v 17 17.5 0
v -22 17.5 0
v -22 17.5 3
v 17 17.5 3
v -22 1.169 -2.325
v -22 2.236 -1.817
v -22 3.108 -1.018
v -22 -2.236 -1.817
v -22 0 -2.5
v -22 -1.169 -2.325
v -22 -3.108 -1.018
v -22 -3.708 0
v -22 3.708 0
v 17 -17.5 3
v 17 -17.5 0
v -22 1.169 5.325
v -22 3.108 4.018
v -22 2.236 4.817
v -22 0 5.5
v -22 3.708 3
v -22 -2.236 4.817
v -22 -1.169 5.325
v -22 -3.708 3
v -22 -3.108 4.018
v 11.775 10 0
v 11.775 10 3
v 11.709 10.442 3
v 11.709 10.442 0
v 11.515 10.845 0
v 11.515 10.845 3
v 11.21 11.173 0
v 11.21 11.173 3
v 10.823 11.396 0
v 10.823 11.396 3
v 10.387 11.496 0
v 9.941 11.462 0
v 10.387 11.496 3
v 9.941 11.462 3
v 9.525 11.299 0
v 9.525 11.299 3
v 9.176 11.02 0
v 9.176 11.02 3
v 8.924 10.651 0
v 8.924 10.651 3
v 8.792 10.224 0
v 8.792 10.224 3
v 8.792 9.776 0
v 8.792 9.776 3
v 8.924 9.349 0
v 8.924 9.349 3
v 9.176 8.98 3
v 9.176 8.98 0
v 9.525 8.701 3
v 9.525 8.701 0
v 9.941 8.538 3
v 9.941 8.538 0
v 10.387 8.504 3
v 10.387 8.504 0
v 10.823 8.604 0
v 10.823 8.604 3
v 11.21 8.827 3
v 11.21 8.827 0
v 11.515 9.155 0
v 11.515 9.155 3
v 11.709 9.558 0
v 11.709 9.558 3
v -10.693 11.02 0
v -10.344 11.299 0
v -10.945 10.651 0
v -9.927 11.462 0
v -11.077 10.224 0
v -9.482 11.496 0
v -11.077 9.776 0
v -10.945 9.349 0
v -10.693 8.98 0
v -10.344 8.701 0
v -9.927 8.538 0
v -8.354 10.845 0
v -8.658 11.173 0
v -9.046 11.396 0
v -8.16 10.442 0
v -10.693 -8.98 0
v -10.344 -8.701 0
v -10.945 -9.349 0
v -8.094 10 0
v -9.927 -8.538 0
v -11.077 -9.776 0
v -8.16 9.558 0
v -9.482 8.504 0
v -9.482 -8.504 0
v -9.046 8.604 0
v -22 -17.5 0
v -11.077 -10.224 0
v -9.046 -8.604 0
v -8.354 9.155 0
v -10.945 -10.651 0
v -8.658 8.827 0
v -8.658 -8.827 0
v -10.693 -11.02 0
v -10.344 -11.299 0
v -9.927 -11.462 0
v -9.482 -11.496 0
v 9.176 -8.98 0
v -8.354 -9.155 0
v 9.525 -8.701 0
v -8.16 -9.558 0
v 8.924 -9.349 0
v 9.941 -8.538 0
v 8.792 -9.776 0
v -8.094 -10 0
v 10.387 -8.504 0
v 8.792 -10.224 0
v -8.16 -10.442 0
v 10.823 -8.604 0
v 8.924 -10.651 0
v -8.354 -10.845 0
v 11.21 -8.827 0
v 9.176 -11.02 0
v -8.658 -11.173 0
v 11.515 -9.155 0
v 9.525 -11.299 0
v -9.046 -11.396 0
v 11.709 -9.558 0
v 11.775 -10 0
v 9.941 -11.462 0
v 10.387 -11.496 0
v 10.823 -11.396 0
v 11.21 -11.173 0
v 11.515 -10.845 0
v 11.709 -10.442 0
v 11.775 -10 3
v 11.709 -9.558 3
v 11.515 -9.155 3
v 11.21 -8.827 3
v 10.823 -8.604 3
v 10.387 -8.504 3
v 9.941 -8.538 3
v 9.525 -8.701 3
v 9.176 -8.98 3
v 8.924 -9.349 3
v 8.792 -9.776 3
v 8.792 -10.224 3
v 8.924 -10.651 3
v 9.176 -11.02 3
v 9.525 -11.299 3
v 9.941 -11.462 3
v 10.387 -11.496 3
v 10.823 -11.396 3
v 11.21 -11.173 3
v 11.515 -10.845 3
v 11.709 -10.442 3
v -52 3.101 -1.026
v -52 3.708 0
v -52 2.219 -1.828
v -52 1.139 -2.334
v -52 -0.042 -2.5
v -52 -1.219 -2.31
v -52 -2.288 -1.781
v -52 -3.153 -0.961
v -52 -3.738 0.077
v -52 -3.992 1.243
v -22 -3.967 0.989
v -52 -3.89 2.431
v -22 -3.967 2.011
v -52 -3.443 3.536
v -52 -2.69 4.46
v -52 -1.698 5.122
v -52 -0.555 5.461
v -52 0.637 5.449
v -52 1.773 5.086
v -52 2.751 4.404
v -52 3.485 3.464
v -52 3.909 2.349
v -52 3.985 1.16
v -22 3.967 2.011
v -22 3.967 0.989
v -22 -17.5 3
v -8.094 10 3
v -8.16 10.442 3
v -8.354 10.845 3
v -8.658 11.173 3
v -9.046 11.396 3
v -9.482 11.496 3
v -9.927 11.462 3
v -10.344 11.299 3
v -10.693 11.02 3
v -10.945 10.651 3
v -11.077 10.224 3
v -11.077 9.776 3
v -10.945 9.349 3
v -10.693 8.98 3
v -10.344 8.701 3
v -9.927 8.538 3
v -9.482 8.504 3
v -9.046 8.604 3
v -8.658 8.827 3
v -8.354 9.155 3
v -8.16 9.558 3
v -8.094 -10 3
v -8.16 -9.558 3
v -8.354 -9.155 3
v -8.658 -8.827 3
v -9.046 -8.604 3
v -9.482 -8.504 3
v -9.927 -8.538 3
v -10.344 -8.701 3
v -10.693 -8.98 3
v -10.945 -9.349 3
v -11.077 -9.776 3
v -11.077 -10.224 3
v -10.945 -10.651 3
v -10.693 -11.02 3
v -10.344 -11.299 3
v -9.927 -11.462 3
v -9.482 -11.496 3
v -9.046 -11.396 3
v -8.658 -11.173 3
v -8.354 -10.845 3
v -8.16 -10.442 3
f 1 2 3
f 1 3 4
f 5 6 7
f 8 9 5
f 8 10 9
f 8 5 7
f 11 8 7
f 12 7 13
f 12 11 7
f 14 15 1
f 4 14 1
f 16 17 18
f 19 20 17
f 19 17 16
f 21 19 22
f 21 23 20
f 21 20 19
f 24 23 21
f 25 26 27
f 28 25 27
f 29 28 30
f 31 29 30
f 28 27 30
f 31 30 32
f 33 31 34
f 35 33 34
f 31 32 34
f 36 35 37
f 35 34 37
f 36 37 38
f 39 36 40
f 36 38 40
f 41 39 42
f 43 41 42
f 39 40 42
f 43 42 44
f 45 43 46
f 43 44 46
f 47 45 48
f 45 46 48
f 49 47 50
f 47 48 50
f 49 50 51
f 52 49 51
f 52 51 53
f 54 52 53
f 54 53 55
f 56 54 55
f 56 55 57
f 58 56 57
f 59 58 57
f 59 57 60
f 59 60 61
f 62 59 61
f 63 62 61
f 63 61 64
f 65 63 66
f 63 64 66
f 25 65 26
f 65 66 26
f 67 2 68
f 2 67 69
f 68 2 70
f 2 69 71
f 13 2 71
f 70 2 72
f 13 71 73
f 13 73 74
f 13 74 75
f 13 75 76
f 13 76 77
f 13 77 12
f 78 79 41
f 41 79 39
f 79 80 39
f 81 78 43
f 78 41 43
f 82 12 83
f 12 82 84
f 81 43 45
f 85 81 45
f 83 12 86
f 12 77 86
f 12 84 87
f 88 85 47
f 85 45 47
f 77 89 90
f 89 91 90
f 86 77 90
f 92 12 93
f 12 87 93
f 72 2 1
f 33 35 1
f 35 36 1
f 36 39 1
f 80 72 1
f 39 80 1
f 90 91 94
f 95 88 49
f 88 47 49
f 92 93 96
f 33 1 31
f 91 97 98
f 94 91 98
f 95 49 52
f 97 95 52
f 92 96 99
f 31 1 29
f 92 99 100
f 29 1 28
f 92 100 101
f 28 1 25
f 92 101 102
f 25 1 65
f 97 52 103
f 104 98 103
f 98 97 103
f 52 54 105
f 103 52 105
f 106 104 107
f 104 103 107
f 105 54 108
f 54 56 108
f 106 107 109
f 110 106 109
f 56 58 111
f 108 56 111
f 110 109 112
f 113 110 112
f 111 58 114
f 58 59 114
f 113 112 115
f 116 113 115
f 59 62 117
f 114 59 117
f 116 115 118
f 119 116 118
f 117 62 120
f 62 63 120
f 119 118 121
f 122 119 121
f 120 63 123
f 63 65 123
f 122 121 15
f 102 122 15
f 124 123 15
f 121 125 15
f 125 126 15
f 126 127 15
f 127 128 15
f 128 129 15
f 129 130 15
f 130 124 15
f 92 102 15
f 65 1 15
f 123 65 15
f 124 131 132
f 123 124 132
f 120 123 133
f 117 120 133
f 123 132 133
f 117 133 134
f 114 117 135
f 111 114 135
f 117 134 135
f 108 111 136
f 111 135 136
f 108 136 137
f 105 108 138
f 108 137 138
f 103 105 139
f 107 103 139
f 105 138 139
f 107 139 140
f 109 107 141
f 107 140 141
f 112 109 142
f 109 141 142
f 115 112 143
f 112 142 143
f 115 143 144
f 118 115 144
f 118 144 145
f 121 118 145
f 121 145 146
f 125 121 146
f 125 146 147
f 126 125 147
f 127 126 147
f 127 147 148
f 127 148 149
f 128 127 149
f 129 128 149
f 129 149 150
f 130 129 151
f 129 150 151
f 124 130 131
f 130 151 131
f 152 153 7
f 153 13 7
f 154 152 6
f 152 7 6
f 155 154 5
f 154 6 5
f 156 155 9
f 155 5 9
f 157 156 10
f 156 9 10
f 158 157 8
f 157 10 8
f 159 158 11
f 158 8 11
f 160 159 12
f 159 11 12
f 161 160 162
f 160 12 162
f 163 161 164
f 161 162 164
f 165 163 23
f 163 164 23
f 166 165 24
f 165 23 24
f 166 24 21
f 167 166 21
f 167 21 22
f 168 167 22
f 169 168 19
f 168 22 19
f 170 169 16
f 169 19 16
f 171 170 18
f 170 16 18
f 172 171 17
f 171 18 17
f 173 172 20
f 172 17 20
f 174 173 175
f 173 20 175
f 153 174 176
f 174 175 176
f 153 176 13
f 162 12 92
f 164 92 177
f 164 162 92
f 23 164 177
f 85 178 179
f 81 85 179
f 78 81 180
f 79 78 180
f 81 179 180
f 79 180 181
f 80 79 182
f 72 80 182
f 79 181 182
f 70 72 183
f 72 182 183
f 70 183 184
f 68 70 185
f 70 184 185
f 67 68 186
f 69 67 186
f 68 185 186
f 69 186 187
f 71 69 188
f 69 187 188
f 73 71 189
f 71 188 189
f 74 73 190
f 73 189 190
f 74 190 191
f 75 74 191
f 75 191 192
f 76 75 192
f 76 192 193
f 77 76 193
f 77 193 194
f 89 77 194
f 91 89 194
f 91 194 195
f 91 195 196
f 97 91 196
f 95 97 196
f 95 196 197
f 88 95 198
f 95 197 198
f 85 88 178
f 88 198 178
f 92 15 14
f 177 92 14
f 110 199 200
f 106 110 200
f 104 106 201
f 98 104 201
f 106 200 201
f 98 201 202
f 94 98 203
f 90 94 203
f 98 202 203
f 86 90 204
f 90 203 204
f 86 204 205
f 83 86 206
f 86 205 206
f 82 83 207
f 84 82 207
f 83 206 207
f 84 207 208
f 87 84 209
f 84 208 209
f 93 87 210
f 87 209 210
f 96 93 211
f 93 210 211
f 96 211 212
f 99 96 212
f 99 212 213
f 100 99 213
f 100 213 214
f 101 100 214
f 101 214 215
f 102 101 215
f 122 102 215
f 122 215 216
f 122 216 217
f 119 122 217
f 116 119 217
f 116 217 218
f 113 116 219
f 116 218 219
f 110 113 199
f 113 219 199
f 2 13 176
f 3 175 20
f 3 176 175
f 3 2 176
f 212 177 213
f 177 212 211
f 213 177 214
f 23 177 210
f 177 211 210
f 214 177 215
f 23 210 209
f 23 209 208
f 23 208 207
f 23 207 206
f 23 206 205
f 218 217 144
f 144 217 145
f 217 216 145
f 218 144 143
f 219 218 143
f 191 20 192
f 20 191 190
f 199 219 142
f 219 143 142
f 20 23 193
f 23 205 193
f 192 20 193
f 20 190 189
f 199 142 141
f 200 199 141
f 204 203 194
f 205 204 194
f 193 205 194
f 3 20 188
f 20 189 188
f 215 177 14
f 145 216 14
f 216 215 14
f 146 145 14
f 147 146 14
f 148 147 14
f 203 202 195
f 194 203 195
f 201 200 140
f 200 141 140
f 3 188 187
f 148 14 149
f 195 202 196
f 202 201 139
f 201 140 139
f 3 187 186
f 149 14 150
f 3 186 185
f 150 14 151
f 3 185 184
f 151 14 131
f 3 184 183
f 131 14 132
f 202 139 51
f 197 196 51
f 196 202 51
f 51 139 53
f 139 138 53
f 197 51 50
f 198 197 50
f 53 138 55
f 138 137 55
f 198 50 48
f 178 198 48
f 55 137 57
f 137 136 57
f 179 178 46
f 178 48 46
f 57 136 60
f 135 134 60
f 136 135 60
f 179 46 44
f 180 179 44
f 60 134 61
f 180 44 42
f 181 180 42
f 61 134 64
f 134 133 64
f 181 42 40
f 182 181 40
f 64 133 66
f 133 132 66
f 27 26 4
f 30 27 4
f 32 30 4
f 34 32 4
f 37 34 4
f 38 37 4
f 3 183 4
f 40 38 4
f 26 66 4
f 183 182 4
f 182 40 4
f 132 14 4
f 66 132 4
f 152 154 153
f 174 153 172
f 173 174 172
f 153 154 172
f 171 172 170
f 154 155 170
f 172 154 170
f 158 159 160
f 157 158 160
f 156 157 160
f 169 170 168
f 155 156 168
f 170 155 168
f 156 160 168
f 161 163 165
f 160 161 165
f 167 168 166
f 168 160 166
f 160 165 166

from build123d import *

# Parameters (mm, degrees)
SKETCH_1_W           = 34
SKETCH_1_H           = 35
EXTRUDE_1_DEPTH      = 3
SKETCH_2_W           = 5
SKETCH_2_H           = 5
EXTRUDE_2_DEPTH      = 3
SKETCH_7_R           = 1.5
CUT_EXTRUDE_7_DEPTH  = 3
SKETCH_14_R          = 4
EXTRUDE_6_DEPTH      = 25
EXTRUDE_START        = 5
SKETCH_16_R          = 4
EXTRUDE_7_DEPTH      = 5
CUT_EXTRUDE_START    = -5
CUT_EXTRUDE_9_DEPTH  = 5
EXTRUDE_8_DEPTH      = 5
SKETCH_19_W          = 5
SKETCH_19_H          = 2.5
CUT_EXTRUDE_10_DEPTH = 59.857879676
SKETCH_20_R          = 4
EXTRUDE_9_DEPTH      = 29.5
SKETCH_21_W          = 26.980293682
SKETCH_21_H          = 10.390157326
CUT_EXTRUDE_11_DEPTH = 85.305990297


with BuildPart() as part:
    # 草图1 → 凸台-拉伸1 (new body)
    with BuildSketch(Plane.XY):
        Rectangle(SKETCH_1_W, SKETCH_1_H)
    extrude(amount=EXTRUDE_1_DEPTH)

    # 草图2 → 凸台-拉伸2 (add)
    with BuildSketch(Plane.XY.offset(3)):
        with Locations((-19.5, 2.5)):
            Rectangle(SKETCH_2_W, SKETCH_2_H)
        with Locations((-19.5, -2.5)):
            Rectangle(SKETCH_2_W, SKETCH_2_H)
    extrude(amount=-EXTRUDE_2_DEPTH)

    # 草图7 → 切除-拉伸7 (cut)
    with BuildSketch(Plane.XY.offset(3)):
        with Locations((10.27515824, 10)):
            Circle(SKETCH_7_R)
        with Locations((10.27515824, -10)):
            Circle(SKETCH_7_R)
        with Locations((-9.593631375, 10)):
            Circle(SKETCH_7_R)
        with Locations((-9.593631375, -10)):
            Circle(SKETCH_7_R)
    extrude(amount=-CUT_EXTRUDE_7_DEPTH, mode=Mode.SUBTRACT)

    # 草图14 → 凸台-拉伸6 (add)
    with BuildSketch(Plane.ZY.offset(22)):
        with Locations(Location((1.5, 0, 0), (0, 0, 112.024312837))):
            Circle(SKETCH_14_R)
    extrude(amount=EXTRUDE_6_DEPTH)

    # 草图16 → 凸台-拉伸7 (add)
    with BuildSketch(Plane(origin=(-22, 0, 0), x_dir=(0, 0, -1), z_dir=(1, 0, 0)).offset(EXTRUDE_START)):
        with Locations(Location((-1.5, 0, 0), (0, 0, 67.975687163))):
            Circle(SKETCH_16_R)
    extrude(amount=-EXTRUDE_7_DEPTH)

    # 草图17 → 切除-拉伸9 (cut)
    with BuildSketch(Plane.ZY.offset(22).offset(CUT_EXTRUDE_START)):
        with BuildLine():
            Line((3, 3.708099244), (3, 5))
            Line((3, 5), (0, 5))
            Line((0, 5), (0, 3.708099244))
            ThreePointArc((0, 3.708099244), (1.5, 4), (3, 3.708099244))
        make_face()
        with BuildLine():
            Line((0, -3.708099244), (0, -5))
            Line((0, -5), (3, -5))
            Line((3, -5), (3, -3.708099244))
            ThreePointArc((3, -3.708099244), (1.5, -4), (0, -3.708099244))
        make_face()
    extrude(amount=CUT_EXTRUDE_9_DEPTH, mode=Mode.SUBTRACT)

    # 草图18 → 凸台-拉伸8 (add)
    with BuildSketch(Plane.ZY.offset(17)):
        with BuildLine():
            Line((3, -17.5), (3, -3.708099244))
            ThreePointArc((3, -3.708099244), (1.5, -4), (0, -3.708099244))
            Line((0, -3.708099244), (0, -17.5))
            Line((0, -17.5), (3, -17.5))
        make_face()
        with BuildLine():
            Line((0, 17.5), (0, 3.708099244))
            ThreePointArc((0, 3.708099244), (1.5, 4), (3, 3.708099244))
            Line((3, 3.708099244), (3, 17.5))
            Line((3, 17.5), (0, 17.5))
        make_face()
    extrude(amount=EXTRUDE_8_DEPTH)

    # 草图19 → 切除-拉伸10 (cut, through all)
    with BuildSketch(Plane.XZ.offset(17.5)):
        with Locations((-19.5, 4.25)):
            Rectangle(SKETCH_19_W, SKETCH_19_H)
        with Locations((-19.5, -1.25)):
            Rectangle(SKETCH_19_W, SKETCH_19_H)
    extrude(amount=-CUT_EXTRUDE_10_DEPTH, mode=Mode.SUBTRACT)

    # 草图20 → 凸台-拉伸9 (add)
    with BuildSketch(Plane.ZY.offset(47)):
        with Locations(Location((1.5, 0, 0), (0, 0, 112.024312837))):
            Circle(SKETCH_20_R)
    extrude(amount=EXTRUDE_9_DEPTH)

    # 草图21 → 切除-拉伸11 (cut, through all)
    with BuildSketch(Plane.XZ.offset(17.5)):
        with Locations((-65.490146841, 2.695078663)):
            Rectangle(SKETCH_21_W, SKETCH_21_H)
    extrude(amount=-CUT_EXTRUDE_11_DEPTH, mode=Mode.SUBTRACT)


solid = part.part
